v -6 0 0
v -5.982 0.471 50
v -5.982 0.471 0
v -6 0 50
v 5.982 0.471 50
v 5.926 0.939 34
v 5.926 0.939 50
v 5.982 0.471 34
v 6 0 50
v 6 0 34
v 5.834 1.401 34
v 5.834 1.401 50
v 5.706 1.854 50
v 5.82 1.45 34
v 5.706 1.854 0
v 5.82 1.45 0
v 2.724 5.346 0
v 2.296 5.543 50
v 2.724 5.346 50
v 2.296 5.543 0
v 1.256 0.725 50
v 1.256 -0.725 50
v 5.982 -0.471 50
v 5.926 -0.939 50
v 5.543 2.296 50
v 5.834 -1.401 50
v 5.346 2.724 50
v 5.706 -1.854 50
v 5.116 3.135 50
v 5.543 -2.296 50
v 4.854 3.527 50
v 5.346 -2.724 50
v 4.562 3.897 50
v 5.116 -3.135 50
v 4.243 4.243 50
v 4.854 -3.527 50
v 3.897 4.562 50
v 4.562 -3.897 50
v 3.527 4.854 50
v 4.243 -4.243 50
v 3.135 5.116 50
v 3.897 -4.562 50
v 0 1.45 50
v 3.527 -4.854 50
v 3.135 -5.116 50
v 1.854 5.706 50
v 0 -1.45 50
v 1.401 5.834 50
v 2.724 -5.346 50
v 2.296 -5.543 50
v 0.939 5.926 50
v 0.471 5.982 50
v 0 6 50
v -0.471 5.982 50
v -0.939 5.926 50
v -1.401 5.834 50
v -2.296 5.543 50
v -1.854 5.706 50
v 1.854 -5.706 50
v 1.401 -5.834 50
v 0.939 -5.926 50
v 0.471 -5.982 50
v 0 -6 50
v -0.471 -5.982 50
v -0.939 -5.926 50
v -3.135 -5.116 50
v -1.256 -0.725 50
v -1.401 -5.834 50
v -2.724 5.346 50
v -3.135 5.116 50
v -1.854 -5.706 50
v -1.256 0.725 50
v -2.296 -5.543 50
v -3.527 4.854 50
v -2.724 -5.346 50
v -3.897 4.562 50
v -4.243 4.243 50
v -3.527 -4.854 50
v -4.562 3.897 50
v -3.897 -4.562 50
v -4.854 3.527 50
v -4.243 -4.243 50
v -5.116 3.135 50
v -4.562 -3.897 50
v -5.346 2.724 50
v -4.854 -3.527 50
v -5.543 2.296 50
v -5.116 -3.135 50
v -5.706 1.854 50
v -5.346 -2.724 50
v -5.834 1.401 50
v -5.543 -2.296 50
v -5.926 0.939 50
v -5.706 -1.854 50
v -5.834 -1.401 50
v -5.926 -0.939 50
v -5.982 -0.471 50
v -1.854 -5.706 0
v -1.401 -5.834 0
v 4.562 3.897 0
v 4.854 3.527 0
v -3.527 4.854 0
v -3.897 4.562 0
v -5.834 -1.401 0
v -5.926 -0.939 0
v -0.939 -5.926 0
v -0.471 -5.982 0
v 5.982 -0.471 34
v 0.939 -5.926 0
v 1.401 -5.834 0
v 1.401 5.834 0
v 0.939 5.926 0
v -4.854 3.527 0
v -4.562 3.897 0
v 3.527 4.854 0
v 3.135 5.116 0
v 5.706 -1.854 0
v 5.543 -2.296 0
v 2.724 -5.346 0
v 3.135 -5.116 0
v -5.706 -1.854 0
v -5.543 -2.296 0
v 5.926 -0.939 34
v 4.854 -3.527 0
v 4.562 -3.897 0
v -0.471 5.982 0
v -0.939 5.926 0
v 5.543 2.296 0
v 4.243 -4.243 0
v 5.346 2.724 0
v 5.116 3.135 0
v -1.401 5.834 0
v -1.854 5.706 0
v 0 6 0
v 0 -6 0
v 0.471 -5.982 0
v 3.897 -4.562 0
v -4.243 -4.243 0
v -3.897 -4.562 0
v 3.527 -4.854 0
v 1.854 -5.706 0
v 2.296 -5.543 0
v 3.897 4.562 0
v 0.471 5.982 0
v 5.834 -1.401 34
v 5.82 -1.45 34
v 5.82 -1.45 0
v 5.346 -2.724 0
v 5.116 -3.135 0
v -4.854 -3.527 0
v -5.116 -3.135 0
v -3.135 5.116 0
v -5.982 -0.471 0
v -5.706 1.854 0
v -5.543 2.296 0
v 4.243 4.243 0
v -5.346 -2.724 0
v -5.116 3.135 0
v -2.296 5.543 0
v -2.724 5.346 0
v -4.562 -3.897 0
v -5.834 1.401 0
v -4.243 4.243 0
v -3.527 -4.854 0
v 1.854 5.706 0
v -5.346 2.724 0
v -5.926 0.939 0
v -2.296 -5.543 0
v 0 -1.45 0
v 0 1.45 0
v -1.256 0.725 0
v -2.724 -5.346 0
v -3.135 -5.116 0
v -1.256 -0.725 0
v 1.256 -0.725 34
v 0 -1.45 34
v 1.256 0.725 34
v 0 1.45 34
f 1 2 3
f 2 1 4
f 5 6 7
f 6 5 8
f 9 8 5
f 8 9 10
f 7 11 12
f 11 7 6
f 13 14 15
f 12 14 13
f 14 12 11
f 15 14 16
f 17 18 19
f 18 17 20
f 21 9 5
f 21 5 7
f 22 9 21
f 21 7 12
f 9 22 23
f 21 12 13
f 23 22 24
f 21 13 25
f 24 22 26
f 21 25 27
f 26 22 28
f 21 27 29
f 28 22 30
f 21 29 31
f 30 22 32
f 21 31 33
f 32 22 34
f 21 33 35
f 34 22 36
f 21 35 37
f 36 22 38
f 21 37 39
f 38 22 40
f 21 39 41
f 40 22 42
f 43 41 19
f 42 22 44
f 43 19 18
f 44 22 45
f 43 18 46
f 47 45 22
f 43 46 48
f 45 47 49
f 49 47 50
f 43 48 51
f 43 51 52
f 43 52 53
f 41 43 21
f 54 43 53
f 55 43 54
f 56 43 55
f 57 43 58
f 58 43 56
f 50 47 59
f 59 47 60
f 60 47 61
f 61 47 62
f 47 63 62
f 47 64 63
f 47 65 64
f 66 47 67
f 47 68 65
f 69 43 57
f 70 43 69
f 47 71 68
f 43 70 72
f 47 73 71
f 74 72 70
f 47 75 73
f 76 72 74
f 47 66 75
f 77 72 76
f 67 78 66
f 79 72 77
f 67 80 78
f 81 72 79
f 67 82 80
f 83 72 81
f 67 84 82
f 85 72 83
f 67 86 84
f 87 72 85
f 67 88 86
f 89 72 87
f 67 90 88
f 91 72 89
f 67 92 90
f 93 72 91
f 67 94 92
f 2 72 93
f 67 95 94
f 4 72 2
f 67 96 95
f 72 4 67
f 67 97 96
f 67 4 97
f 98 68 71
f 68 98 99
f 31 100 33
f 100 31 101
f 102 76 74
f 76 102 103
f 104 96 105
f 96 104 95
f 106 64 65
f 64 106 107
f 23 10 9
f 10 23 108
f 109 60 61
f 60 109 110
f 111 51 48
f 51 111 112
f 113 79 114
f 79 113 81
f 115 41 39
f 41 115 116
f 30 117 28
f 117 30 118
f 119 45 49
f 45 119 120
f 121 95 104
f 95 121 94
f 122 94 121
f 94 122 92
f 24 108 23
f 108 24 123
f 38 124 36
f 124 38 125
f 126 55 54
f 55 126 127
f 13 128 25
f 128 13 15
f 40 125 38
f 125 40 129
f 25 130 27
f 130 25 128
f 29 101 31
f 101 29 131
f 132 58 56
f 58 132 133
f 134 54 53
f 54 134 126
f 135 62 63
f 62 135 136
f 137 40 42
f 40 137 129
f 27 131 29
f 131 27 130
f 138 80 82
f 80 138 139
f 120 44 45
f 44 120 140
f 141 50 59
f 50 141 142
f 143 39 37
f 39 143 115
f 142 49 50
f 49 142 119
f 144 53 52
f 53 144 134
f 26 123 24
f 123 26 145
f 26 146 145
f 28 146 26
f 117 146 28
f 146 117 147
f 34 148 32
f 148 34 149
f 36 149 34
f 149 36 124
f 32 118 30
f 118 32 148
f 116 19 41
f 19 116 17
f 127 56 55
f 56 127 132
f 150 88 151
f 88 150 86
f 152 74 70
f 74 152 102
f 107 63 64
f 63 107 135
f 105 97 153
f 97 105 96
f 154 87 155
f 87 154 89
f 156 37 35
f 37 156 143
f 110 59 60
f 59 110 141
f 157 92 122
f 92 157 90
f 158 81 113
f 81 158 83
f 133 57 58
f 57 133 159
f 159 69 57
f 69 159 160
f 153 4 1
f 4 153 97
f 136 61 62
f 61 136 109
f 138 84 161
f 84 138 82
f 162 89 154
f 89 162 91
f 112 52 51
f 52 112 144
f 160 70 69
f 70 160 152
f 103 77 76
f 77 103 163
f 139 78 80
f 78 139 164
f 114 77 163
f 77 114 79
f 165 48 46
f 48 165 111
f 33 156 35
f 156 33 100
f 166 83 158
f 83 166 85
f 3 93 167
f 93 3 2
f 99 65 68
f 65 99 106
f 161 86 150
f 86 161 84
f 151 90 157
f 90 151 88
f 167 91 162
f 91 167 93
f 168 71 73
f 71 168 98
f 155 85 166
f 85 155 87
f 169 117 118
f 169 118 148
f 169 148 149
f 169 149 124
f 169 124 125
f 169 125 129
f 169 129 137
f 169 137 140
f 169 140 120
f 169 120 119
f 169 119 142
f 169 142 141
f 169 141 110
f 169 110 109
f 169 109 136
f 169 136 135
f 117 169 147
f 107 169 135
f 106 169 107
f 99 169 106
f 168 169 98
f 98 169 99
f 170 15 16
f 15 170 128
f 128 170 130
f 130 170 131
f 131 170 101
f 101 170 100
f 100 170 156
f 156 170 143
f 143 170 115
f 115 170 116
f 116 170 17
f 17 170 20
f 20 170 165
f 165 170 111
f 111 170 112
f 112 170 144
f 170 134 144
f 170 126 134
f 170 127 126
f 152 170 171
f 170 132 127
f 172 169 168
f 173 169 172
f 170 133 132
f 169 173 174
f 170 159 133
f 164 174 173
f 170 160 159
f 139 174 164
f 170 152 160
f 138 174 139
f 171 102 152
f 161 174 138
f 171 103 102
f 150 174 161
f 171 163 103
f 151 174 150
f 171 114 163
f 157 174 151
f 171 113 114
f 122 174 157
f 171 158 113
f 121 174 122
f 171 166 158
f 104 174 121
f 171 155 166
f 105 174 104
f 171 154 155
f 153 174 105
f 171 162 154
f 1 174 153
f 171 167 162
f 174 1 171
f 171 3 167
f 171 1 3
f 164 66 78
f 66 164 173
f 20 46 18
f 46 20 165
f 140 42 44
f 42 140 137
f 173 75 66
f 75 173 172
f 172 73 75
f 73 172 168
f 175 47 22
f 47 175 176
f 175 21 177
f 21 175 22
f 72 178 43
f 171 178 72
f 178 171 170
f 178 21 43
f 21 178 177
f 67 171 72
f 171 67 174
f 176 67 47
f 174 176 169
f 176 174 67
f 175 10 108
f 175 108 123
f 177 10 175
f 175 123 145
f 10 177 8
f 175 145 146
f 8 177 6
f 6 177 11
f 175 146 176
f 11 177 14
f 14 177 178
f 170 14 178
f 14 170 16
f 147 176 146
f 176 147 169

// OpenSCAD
//handle for allen keys

$fn=80;

allen_key_2mm();
//allen_key_1_5mm();

module allen_key_2mm() {
d1=2.9;  //2 mm
d2=12;
difference() {
    cylinder(d=d2, h=50);
    translate([0, 0, -1]) rotate([0, 0, 30]) cylinder(d=d1, h=55, $fn=6);
    translate([0, -d1/2, -1]) cube([10, d1, 35]);
    //translate([0, -2.3/2, 30-2.3]) cube([8, 10, 2.3]);
    }
}

module allen_key_1_5mm() {
d1=2.6;  //1.5 mm
d2=10;

difference() {
    cylinder(d=d2, h=50);
    translate([0, 0, -1]) rotate([0, 0, 30]) cylinder(d=d1, h=55, $fn=6);
    translate([0, -d1/2, -1]) cube([10, d1, 35]);
    //translate([0, -2.3/2, 30-2.3]) cube([8, 10, 2.3]);
    }
}
